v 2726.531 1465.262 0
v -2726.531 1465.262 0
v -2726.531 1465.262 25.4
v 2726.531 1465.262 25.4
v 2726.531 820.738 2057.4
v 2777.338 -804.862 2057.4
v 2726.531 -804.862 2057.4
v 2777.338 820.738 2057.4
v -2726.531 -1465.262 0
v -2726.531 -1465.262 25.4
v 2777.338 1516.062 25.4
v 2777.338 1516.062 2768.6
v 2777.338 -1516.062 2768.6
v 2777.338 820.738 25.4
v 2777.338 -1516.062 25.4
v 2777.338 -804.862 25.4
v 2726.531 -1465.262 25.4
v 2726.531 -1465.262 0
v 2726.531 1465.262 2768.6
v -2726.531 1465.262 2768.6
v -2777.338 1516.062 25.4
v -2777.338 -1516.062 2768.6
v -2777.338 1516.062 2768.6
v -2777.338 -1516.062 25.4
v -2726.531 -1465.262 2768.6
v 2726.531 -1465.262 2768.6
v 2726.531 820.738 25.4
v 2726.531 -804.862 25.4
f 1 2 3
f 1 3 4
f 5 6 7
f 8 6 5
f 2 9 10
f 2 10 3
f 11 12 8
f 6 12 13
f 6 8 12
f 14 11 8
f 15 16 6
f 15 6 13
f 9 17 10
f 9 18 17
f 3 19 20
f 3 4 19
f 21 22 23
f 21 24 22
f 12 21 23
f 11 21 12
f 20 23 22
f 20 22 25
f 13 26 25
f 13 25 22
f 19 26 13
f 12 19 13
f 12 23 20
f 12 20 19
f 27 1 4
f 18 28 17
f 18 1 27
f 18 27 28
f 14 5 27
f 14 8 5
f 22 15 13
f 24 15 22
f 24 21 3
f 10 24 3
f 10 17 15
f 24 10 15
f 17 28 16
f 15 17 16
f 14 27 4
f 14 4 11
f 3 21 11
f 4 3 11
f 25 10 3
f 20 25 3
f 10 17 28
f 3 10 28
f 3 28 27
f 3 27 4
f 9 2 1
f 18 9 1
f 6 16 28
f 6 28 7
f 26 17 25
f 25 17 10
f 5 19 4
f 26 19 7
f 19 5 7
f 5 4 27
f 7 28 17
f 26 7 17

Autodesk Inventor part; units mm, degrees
ref_plane "YZ Plane" through (0, 0, 0) normal (1, 0, 0) x (0, 1, 0)
ref_plane "XZ Plane" through (0, 0, 0) normal (0, 1, 0) x (-1, 0, 0)
ref_plane "XY Plane" through (0, 0, 0) normal (0, 0, 1) x (1, 0, 0)
sketch "Sketch1" plane through (0, 0, 0) normal (0, 0, 1) x (1, 0, 0)
  line L0 (2726.5313, -1465.2625) -> (-2726.5312, -1465.2625)
  line L1 (-2726.5312, -1465.2625) -> (-2726.5312, 1465.2625)
  line L2 (-2726.5312, 1465.2625) -> (2726.5313, 1465.2625)
  line L3 (2726.5313, 1465.2625) -> (2726.5313, -1465.2625)
  line L4 (2726.5313, -1465.2625) -> (-2726.5312, 1465.2625) construction
  line L5 (-2726.5312, -1465.2625) -> (2726.5313, 1465.2625) construction
  point P0 (0, 0)
  dimension "d0" = 5453.0625
  dimension "d1" = 2930.525
extrude "Extrusion1" add sketch "Sketch1" along normal blind 25.4
sketch "Sketch2" plane through (0, 0, 25.4) normal (0, 0, 1) x (1, 0, 0)
  line L0 (2726.5313, 1465.2625) -> (-2726.5312, 1465.2625) projected
  line L1 (2726.5312, -1465.2625) -> (-2726.5312, -1465.2625)
  line L2 (-2726.5312, -1465.2625) -> (-2726.5312, 1465.2625)
  line L3 (-2726.5312, 1465.2625) -> (2726.5312, 1465.2625)
  line L4 (2726.5312, 1465.2625) -> (2726.5312, -1465.2625)
  line L5 (2726.5312, -1465.2625) -> (-2726.5312, 1465.2625) construction
  line L6 (-2726.5312, -1465.2625) -> (2726.5312, 1465.2625) construction
  line L7 (2777.3376, -1516.0625) -> (-2777.3376, -1516.0625)
  line L8 (-2777.3376, -1516.0625) -> (-2777.3376, 1516.0625)
  line L9 (-2777.3376, 1516.0625) -> (2777.3376, 1516.0625)
  line L10 (2777.3376, 1516.0625) -> (2777.3376, -1516.0625)
  line L11 (2777.3376, -1516.0625) -> (-2777.3376, 1516.0625) construction
  line L12 (-2777.3376, -1516.0625) -> (2777.3376, 1516.0625) construction
  point P0 (0, 0)
  dimension "d4" = 5554.6752
  dimension "d5" = 3032.125
extrude "Extrusion2" add sketch "Sketch2" along normal blind 2743.2
sketch "Sketch3" plane through (2777.3376, -1516.0625, 25.4) normal (1, 0, 0) x (0, 0, -1)
  line L0 (0, 50.8) -> (0, 2981.325) projected
  line L1 (0, 711.2) -> (-2032, 711.2)
  line L2 (-2032, 711.2) -> (-2032, 2336.8)
  line L3 (-2032, 2336.8) -> (0, 2336.8)
  line L4 (0, 2336.8) -> (0, 711.2)
  point P0 (25.4, 1516.0625)
  point P1 (0, 2336.8)
  dimension "d8" = 2032
  dimension "d9" = 1625.6
extrude "Extrusion3" cut sketch "Sketch3" against normal up to next
properties part number "Room_0RC039"
